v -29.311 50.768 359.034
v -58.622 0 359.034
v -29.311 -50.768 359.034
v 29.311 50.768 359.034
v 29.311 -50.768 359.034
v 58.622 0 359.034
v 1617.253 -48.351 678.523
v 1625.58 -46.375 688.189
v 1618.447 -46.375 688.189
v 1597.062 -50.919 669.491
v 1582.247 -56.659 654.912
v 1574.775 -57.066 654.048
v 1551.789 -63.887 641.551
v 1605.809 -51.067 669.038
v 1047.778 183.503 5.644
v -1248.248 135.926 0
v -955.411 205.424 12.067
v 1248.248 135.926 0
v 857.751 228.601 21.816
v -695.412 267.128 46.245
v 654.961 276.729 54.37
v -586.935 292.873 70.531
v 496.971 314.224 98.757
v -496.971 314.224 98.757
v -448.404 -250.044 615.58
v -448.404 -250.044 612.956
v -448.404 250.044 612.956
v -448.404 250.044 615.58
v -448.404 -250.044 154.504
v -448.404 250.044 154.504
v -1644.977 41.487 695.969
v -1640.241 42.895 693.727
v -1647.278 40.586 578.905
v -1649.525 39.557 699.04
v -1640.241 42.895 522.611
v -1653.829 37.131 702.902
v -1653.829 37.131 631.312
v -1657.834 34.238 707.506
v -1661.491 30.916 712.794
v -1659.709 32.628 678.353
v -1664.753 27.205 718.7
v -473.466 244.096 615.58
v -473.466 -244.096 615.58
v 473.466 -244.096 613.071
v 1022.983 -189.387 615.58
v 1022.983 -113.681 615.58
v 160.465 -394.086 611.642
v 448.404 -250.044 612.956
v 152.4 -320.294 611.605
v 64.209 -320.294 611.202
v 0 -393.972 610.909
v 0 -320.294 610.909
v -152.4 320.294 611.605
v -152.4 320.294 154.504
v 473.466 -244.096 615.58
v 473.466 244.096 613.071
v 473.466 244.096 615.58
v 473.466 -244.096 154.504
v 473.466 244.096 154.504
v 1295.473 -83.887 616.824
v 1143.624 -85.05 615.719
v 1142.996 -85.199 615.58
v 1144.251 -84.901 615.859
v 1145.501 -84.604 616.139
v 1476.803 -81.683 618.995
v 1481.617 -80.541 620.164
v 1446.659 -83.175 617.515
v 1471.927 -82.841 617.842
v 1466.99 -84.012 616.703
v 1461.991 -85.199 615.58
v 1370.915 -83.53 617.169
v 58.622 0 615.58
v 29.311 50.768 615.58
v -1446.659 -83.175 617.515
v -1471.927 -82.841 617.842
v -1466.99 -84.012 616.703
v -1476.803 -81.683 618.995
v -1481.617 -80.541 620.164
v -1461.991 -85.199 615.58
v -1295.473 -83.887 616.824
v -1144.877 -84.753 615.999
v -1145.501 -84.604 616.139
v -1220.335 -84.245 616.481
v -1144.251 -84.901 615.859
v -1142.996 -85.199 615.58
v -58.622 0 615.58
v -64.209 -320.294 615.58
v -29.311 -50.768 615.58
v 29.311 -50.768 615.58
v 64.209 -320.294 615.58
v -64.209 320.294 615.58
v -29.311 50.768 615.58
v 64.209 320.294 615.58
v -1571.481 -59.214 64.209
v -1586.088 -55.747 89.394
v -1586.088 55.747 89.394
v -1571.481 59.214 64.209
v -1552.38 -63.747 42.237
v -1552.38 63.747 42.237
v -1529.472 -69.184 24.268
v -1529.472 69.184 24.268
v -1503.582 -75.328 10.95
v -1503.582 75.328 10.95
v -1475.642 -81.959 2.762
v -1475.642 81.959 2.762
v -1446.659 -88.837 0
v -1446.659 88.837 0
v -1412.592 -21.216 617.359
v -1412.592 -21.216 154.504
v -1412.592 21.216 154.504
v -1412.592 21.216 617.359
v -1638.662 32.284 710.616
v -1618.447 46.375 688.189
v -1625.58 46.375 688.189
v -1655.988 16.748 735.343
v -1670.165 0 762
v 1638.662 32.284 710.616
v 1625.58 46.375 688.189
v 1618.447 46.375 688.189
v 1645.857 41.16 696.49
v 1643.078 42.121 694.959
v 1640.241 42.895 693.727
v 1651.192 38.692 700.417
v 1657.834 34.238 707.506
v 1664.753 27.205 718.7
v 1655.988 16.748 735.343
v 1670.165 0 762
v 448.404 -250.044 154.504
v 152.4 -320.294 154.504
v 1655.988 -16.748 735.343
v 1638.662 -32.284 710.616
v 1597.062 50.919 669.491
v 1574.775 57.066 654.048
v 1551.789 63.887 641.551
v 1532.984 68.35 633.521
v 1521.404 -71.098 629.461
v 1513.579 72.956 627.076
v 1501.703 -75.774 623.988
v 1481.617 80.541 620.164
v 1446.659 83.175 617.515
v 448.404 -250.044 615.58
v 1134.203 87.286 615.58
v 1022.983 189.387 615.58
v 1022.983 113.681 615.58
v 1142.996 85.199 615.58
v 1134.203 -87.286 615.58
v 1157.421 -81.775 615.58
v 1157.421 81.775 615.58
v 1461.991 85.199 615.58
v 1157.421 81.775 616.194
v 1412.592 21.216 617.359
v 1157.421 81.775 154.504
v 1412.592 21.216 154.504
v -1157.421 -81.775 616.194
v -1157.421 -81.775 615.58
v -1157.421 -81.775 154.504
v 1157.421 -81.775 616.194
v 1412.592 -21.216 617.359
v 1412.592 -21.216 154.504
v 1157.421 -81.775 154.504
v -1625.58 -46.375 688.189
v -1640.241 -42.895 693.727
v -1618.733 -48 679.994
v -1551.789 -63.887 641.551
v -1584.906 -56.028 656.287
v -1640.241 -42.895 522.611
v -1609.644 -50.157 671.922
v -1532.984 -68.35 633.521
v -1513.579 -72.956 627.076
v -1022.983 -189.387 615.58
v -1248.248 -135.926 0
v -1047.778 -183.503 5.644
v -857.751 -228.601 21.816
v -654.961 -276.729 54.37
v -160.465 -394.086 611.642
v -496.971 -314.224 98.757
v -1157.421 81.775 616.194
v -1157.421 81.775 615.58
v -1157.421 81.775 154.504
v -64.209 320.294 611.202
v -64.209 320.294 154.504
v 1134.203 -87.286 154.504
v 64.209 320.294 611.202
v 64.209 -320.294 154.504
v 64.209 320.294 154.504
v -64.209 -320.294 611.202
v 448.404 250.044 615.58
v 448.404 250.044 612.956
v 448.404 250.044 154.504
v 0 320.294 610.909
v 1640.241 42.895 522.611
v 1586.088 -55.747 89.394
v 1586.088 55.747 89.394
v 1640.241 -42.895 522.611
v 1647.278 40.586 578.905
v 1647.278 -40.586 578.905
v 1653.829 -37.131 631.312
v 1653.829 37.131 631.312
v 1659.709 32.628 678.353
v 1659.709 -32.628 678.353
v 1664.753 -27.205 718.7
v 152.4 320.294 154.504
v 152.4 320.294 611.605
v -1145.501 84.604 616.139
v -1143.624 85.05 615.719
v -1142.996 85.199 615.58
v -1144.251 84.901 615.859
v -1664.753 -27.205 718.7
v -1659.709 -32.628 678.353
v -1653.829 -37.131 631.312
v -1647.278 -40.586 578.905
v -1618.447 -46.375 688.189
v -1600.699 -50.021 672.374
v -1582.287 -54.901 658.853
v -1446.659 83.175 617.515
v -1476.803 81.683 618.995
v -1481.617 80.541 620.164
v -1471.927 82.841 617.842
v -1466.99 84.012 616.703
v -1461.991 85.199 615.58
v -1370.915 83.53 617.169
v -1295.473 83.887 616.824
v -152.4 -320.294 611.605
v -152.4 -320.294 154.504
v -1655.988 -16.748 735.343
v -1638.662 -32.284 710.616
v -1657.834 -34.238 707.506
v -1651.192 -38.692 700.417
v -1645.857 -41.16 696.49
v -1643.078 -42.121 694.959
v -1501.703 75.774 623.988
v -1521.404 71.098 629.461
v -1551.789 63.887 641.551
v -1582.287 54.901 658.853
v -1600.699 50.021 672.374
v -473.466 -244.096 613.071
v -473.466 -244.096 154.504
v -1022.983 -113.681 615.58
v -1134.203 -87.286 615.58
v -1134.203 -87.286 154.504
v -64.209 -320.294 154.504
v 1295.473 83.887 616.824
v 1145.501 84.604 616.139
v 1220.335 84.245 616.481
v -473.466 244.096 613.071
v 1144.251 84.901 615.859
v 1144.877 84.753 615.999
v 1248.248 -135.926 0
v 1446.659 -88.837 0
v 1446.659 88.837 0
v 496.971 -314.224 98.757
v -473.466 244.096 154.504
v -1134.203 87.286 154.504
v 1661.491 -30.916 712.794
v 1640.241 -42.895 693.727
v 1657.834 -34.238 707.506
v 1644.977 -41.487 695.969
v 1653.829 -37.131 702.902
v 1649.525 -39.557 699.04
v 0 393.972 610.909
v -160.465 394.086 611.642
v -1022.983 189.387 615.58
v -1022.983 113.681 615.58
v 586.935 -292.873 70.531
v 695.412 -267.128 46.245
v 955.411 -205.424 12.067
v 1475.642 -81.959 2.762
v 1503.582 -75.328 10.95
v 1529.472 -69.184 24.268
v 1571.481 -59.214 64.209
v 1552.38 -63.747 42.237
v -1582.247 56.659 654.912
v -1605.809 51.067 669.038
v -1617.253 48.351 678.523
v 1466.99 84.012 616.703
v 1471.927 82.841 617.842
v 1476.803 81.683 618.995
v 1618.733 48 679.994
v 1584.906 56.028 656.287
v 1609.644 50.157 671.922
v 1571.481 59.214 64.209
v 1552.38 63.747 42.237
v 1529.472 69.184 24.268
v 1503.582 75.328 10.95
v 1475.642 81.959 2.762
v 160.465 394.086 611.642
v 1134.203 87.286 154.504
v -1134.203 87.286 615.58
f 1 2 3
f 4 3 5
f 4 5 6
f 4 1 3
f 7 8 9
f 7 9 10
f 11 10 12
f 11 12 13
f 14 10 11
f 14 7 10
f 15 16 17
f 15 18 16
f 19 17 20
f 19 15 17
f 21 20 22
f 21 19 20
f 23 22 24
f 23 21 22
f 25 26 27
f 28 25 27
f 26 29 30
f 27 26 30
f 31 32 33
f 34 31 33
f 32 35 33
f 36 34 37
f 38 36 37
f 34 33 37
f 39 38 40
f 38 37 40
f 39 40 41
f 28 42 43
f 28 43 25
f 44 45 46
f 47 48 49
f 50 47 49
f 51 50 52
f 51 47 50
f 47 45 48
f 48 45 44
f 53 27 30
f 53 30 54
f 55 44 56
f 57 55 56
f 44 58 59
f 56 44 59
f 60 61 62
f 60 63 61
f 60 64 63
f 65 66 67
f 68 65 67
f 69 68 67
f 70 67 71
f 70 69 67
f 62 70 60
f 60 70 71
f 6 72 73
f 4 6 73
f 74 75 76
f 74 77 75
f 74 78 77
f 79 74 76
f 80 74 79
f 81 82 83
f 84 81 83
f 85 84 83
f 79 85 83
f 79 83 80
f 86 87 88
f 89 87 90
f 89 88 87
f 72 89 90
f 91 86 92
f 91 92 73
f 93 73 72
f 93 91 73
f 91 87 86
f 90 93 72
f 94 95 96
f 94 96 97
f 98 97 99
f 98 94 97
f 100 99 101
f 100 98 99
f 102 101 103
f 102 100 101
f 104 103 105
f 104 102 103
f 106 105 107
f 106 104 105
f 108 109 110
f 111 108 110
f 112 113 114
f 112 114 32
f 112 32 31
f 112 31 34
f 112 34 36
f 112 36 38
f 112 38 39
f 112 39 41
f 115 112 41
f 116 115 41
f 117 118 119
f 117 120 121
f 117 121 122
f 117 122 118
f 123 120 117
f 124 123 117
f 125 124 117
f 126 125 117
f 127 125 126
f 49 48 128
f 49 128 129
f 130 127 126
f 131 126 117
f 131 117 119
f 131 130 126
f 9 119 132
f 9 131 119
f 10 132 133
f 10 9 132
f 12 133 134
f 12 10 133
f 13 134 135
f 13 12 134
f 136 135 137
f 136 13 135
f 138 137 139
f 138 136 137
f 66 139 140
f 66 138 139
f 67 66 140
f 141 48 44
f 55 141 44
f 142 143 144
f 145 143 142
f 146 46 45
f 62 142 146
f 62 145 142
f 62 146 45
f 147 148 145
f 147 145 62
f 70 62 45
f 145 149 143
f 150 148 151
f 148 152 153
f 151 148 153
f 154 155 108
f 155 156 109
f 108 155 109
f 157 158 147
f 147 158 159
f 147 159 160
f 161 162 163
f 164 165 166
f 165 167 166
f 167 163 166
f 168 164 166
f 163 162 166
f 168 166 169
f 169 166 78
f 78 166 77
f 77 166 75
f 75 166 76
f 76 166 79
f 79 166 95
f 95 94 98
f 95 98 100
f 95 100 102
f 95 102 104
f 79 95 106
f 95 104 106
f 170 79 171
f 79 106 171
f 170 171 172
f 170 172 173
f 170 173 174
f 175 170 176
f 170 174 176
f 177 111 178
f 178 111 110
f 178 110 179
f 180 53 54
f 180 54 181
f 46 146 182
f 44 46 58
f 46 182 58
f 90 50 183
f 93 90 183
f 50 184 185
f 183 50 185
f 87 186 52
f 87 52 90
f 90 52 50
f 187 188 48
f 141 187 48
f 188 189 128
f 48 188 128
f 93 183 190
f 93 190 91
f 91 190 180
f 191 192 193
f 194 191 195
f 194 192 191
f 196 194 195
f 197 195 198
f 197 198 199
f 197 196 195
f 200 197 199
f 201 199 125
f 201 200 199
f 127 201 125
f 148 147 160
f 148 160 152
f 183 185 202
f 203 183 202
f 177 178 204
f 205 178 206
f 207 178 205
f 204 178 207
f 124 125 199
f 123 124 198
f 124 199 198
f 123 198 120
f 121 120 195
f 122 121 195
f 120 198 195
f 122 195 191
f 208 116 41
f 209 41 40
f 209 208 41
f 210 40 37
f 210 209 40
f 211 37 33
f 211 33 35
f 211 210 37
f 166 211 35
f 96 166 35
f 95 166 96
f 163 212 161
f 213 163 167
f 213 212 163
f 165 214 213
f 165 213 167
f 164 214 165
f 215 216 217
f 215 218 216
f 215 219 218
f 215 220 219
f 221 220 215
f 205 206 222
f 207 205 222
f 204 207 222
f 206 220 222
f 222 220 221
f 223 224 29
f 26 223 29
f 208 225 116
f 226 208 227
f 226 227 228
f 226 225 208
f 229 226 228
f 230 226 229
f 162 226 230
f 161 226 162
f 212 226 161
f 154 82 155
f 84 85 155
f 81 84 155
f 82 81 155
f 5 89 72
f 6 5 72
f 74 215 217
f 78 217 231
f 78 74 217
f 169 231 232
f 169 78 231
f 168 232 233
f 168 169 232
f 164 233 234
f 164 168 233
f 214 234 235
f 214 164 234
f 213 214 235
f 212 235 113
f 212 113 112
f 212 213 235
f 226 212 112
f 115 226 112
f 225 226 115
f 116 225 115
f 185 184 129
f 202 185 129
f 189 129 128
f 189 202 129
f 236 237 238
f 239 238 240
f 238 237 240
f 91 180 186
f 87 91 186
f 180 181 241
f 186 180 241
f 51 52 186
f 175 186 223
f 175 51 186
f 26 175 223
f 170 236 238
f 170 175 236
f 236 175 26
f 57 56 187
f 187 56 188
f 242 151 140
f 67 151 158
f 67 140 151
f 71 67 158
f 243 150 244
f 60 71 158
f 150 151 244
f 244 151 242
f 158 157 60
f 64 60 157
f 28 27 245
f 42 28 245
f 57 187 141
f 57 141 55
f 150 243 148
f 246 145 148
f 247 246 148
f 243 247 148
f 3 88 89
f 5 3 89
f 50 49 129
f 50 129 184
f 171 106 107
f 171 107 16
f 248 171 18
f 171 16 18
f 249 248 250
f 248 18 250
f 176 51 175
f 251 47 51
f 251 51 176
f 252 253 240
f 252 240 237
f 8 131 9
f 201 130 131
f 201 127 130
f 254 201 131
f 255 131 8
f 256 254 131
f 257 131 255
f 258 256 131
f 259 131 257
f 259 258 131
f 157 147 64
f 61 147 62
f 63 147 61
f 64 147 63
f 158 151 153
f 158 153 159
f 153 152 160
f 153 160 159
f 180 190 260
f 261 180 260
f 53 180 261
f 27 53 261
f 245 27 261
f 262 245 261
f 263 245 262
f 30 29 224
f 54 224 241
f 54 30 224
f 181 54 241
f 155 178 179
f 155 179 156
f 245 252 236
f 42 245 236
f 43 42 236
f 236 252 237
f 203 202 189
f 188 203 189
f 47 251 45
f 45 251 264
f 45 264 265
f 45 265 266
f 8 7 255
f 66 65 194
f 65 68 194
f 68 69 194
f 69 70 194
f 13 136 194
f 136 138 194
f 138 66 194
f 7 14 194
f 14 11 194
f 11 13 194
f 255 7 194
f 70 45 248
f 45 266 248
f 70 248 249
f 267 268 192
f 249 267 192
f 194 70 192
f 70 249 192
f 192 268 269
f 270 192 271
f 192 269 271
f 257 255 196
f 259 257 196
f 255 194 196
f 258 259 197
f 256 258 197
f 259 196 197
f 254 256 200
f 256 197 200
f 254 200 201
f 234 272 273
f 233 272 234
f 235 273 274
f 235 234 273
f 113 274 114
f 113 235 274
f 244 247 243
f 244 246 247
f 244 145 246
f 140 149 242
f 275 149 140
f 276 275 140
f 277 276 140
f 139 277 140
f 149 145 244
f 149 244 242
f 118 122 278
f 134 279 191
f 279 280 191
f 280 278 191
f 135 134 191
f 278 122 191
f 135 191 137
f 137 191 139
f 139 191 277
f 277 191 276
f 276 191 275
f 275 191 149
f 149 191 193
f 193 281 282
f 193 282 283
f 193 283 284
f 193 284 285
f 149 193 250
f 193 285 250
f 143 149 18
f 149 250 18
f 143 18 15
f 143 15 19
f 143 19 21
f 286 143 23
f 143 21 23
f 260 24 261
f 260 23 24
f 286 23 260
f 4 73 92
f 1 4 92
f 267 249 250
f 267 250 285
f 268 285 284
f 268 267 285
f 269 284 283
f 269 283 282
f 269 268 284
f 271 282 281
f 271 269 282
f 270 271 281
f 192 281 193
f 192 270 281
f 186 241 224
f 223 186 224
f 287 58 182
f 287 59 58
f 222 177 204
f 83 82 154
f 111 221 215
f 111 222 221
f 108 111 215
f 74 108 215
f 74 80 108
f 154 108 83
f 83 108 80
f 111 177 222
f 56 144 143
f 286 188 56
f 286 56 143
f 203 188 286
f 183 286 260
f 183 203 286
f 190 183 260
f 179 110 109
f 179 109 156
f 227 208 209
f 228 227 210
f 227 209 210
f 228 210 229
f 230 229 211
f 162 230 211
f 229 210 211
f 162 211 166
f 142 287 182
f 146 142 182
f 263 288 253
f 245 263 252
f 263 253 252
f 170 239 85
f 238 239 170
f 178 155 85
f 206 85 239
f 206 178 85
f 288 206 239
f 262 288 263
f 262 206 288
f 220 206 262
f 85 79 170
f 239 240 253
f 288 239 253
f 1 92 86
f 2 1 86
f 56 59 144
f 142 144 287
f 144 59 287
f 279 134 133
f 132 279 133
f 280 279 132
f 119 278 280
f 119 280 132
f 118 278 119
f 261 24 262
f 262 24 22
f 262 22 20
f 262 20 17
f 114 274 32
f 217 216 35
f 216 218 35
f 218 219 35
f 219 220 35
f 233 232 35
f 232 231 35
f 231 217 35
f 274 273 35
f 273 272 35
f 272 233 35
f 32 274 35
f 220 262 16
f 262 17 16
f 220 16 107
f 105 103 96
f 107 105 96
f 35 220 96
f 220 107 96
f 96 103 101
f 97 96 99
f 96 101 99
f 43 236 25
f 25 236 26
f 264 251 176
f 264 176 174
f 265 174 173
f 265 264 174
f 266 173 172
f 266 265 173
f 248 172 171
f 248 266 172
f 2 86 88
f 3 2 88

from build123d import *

# Parameters (mm, degrees)
F1_DEPTH  = 762
F3_DEPTH  = 3262.12516
F5_DEPTH  = 5632.86409
F0_W      = 64.2092358321
F0_H      = 320.2939988333
F6_DEPTH  = 615.5799728
F7_DEPTH  = 154.50383
F8_DEPTH  = 5077.3668
F10_DEPTH = 256.54628


with BuildPart() as f1:
    # F0 (on Top) → F1 (new body)
    with BuildSketch(Plane.XY):
        with BuildLine():
            Line((152.4, 396), (0, 396))
            Line((0, 396), (0, 320.2939988333))
            Line((0, 320.2939988333), (64.2092358321, 320.2939988333))
            Line((64.2092358321, 320.2939988333), (152.4, 320.2939988333))
            Line((152.4, 320.2939988333), (448.4036082625, 250.0443583168))
            Line((448.4036082625, 250.0443583168), (473.4656074554, 244.0964698966))
            Line((473.4656074554, 244.0964698966), (1134.202851765, 87.2856993755))
            Line((1134.202851765, 87.2856993755), (1157.4211369828, 81.7753740131))
            Line((1157.4211369828, 81.7753740131), (1412.5922299482, 21.2163907755))
            Line((1412.5922299482, 21.2163907755), (1412.5922299482, 0))
            Line((1412.5922299482, 0), (1674.1474049633, 0))
            ThreePointArc((1674.1474049633, 0), (1664.6471807808, 27.3388481675), (1640.2409076691, 42.8952202201))
            Line((1640.2409076691, 42.8952202201), (152.4, 396))
        make_face()
        with BuildLine():
            Line((0, 320.2939988333), (0, 396))
            Line((0, 396), (-152.4, 396))
            Line((-152.4, 396), (-1640.2409076691, 42.8952202201))
            ThreePointArc((-1640.2409076691, 42.8952202201), (-1664.6471807808, 27.3388481675), (-1674.1474049633, 0))
            Line((-1674.1474049633, 0), (-1412.5922299482, 0))
            Line((-1412.5922299482, 0), (-1412.5922299482, 21.2163907755))
            Line((-1412.5922299482, 21.2163907755), (-1157.4211369828, 81.7753740131))
            Line((-1157.4211369828, 81.7753740131), (-1134.202851765, 87.2856993755))
            Line((-1134.202851765, 87.2856993755), (-473.4656074554, 244.0964698966))
            Line((-473.4656074554, 244.0964698966), (-448.4036082625, 250.0443583168))
            Line((-448.4036082625, 250.0443583168), (-152.4, 320.2939988333))
            Line((-152.4, 320.2939988333), (-64.2092358321, 320.2939988333))
            Line((-64.2092358321, 320.2939988333), (0, 320.2939988333))
        make_face()
        with BuildLine():
            Line((64.2092358321, -320.2939988333), (0, -320.2939988333))
            Line((0, -320.2939988333), (0, -396))
            Line((0, -396), (152.4, -396))
            Line((152.4, -396), (1640.2409076691, -42.8952202201))
            ThreePointArc((1640.2409076691, -42.8952202201), (1664.6471807808, -27.3388481675), (1674.1474049633, 0))
            Line((1674.1474049633, 0), (1412.5922299482, 0))
            Line((1412.5922299482, 0), (1412.5922299482, -21.2163907755))
            Line((1412.5922299482, -21.2163907755), (1157.4211369828, -81.7753740131))
            Line((1157.4211369828, -81.7753740131), (1134.202851765, -87.2856993755))
            Line((1134.202851765, -87.2856993755), (473.4656074554, -244.0964698966))
            Line((473.4656074554, -244.0964698966), (448.4036082625, -250.0443583168))
            Line((448.4036082625, -250.0443583168), (152.4, -320.2939988333))
            Line((152.4, -320.2939988333), (64.2092358321, -320.2939988333))
        make_face()
        with BuildLine():
            Line((0, -396), (0, -320.2939988333))
            Line((0, -320.2939988333), (-64.2092358321, -320.2939988333))
            Line((-64.2092358321, -320.2939988333), (-152.4, -320.2939988333))
            Line((-152.4, -320.2939988333), (-448.4036082625, -250.0443583168))
            Line((-448.4036082625, -250.0443583168), (-473.4656074554, -244.0964698966))
            Line((-473.4656074554, -244.0964698966), (-1134.202851765, -87.2856993755))
            Line((-1134.202851765, -87.2856993755), (-1157.4211369828, -81.7753740131))
            Line((-1157.4211369828, -81.7753740131), (-1412.5922299482, -21.2163907755))
            Line((-1412.5922299482, -21.2163907755), (-1412.5922299482, 0))
            Line((-1412.5922299482, 0), (-1674.1474049633, 0))
            ThreePointArc((-1674.1474049633, 0), (-1664.6471807808, -27.3388481675), (-1640.2409076691, -42.8952202201))
            Line((-1640.2409076691, -42.8952202201), (-152.4, -396))
            Line((-152.4, -396), (0, -396))
        make_face()
    extrude(amount=F1_DEPTH)

    # F2 (on Front) → F3 (intersect, symmetric)
    with BuildSketch(Plane.XZ):
        Polygon((-1446.6592213701, 617.5145506859), (-1446.6592213701, 0), (0, 0), (1446.6592213701, 0), (1446.6592213701, 617.5145506859), (0, 610.9088516681), align=None)
        with BuildLine():
            ThreePointArc((-1586.0875844955, 89.3943980336), (-1529.4717005681, 24.2677958419), (-1446.6592213701, 0))
            Line((-1446.6592213701, 0), (-1446.6592213701, 617.5145506859))
            ThreePointArc((-1446.6592213701, 617.5145506859), (-1579.5504767394, 657.0582695217), (-1670.16518116, 762))
            Line((-1670.16518116, 762), (-1586.0875844955, 89.3943980336))
        make_face()
        with BuildLine():
            Line((1446.6592213701, 617.5145506859), (1446.6592213701, 0))
            ThreePointArc((1446.6592213701, 0), (1529.4717005681, 24.2677958419), (1586.0875844955, 89.3943980336))
            Line((1586.0875844955, 89.3943980336), (1670.16518116, 762))
            ThreePointArc((1670.16518116, 762), (1579.5504767394, 657.0582695217), (1446.6592213701, 617.5145506859))
        make_face()
    extrude(amount=F3_DEPTH, both=True, mode=Mode.INTERSECT)

    # F4 (on Right) → F5 (intersect, symmetric)
    with BuildSketch(Plane.YZ):
        with BuildLine():
            Line((314.2239749432, 98.7573415041), (394.6990966797, 615.5799728))
            Line((394.6990966797, 615.5799728), (85.1987600327, 615.5799728))
            ThreePointArc((85.1987600327, 615.5799728), (59.7792722532, 648.6725517035), (46.3746413589, 688.1894469261))
            Line((46.3746413589, 688.1894469261), (0, 762))
            Line((0, 762), (0, 0))
            Line((0, 0), (135.9257698059, 0))
            ThreePointArc((135.9257698059, 0), (237.7059563227, 26.5742942613), (314.2239749432, 98.7573415041))
        make_face()
        with BuildLine():
            Line((0, 0), (0, 762))
            Line((0, 762), (-46.3746413589, 688.1894469261))
            ThreePointArc((-46.3746413589, 688.1894469261), (-59.7792722532, 648.6725517035), (-85.1987600327, 615.5799728))
            Line((-85.1987600327, 615.5799728), (-394.6990966797, 615.5799728))
            Line((-394.6990966797, 615.5799728), (-314.2239749432, 98.7573415041))
            ThreePointArc((-314.2239749432, 98.7573415041), (-237.7059563227, 26.5742942613), (-135.9257698059, 0))
            Line((-135.9257698059, 0), (0, 0))
        make_face()
    extrude(amount=F5_DEPTH, both=True, mode=Mode.INTERSECT)

    # F0 (on Top) → F6 (join)
    with BuildSketch(Plane.XY):
        Polygon((-1157.4211369828, 81.7753740131), (-1157.4211369828, 0), (-1134.202851765, 0), (-1134.202851765, 87.2856993755), align=None)
        Polygon((-1134.202851765, 0), (-1157.4211369828, 0), (-1157.4211369828, -81.7753740131), (-1134.202851765, -87.2856993755), align=None)
        Polygon((-473.4656074554, 0), (-448.4036082625, 0), (-448.4036082625, 250.0443583168), (-473.4656074554, 244.0964698966), align=None)
        Polygon((-448.4036082625, -250.0443583168), (-448.4036082625, 0), (-473.4656074554, 0), (-473.4656074554, -244.0964698966), align=None)
        with Locations((32.104617916, 160.1469994167)):
            Rectangle(F0_W, F0_H)
        with Locations((32.104617916, -160.1469994167)):
            Rectangle(F0_W, F0_H)
        with Locations((-32.104617916, -160.1469994167)):
            Rectangle(F0_W, F0_H)
        with Locations((-32.104617916, 160.1469994167)):
            Rectangle(F0_W, F0_H)
        Polygon((448.4036082625, 250.0443583168), (448.4036082625, 0), (473.4656074554, 0), (473.4656074554, 244.0964698965), align=None)
        Polygon((473.4656074554, 0), (448.4036082625, 0), (448.4036082625, -250.0443583168), (473.4656074554, -244.0964698966), align=None)
        Polygon((1134.202851765, 0), (1157.4211369828, 0), (1157.4211369828, 81.7753740131), (1134.202851765, 87.2856993755), align=None)
        Polygon((1157.4211369828, -81.7753740131), (1157.4211369828, 0), (1134.202851765, 0), (1134.202851765, -87.2856993755), align=None)
    extrude(amount=F6_DEPTH)

    # F0 (on Top) → F7 (join)
    with BuildSketch(Plane.XY):
        Polygon((-64.2092358321, 0), (-64.2092358321, 320.2939988333), (-152.4, 320.2939988333), (-448.4036082625, 250.0443583168), (-448.4036082625, 0), align=None)
        Polygon((-1134.202851765, 0), (-473.4656074554, 0), (-473.4656074554, 244.0964698965), (-1134.202851765, 87.2856993755), align=None)
        Polygon((-1412.5922299482, 21.2163907755), (-1412.5922299482, 0), (-1157.4211369828, 0), (-1157.4211369828, 81.7753740131), align=None)
        Polygon((-1157.4211369828, 0), (-1412.5922299482, 0), (-1412.5922299482, -21.2163907755), (-1157.4211369828, -81.7753740131), align=None)
        Polygon((-473.4656074554, -244.0964698966), (-473.4656074554, 0), (-1134.202851765, 0), (-1134.202851765, -87.2856993755), align=None)
        Polygon((-64.2092358321, -320.2939988333), (-64.2092358321, 0), (-448.4036082625, 0), (-448.4036082625, -250.0443583168), (-152.4, -320.2939988333), align=None)
        Polygon((152.4, 320.2939988333), (64.2092358321, 320.2939988333), (64.2092358321, 0), (448.4036082625, 0), (448.4036082625, 250.0443583168), align=None)
        Polygon((448.4036082625, 0), (64.2092358321, 0), (64.2092358321, -320.2939988333), (152.4, -320.2939988333), (448.4036082625, -250.0443583168), align=None)
        Polygon((1134.202851765, 0), (473.4656074554, 0), (473.4656074554, -244.0964698965), (1134.202851765, -87.2856993755), align=None)
        Polygon((473.4656074554, 244.0964698965), (473.4656074554, 0), (1134.202851765, 0), (1134.202851765, 87.2856993755), align=None)
        Polygon((1157.4211369828, 0), (1412.5922299482, 0), (1412.5922299482, 21.2163907755), (1157.4211369828, 81.7753740131), align=None)
        Polygon((1412.5922299482, -21.2163907755), (1412.5922299482, 0), (1157.4211369828, 0), (1157.4211369828, -81.7753740131), align=None)
    extrude(amount=F7_DEPTH)

    # F4 (on Right) → F8 (intersect, symmetric)
    with BuildSketch(Plane.YZ):
        with BuildLine():
            Line((314.2239749432, 98.7573415041), (394.6990966797, 615.5799728))
            Line((394.6990966797, 615.5799728), (85.1987600327, 615.5799728))
            ThreePointArc((85.1987600327, 615.5799728), (59.7792722532, 648.6725517035), (46.3746413589, 688.1894469261))
            Line((46.3746413589, 688.1894469261), (0, 762))
            Line((0, 762), (0, 0))
            Line((0, 0), (135.9257698059, 0))
            ThreePointArc((135.9257698059, 0), (237.7059563227, 26.5742942613), (314.2239749432, 98.7573415041))
        make_face()
        with BuildLine():
            Line((0, 0), (0, 762))
            Line((0, 762), (-46.3746413589, 688.1894469261))
            ThreePointArc((-46.3746413589, 688.1894469261), (-59.7792722532, 648.6725517035), (-85.1987600327, 615.5799728))
            Line((-85.1987600327, 615.5799728), (-394.6990966797, 615.5799728))
            Line((-394.6990966797, 615.5799728), (-314.2239749432, 98.7573415041))
            ThreePointArc((-314.2239749432, 98.7573415041), (-237.7059563227, 26.5742942613), (-135.9257698059, 0))
            Line((-135.9257698059, 0), (0, 0))
        make_face()
    extrude(amount=F8_DEPTH, both=True, mode=Mode.INTERSECT)

    # F9 (on face) → F10 (cut)
    with BuildSketch(Plane.XY.offset(615.5799728)):
        Polygon((-29.3112018763, -50.7684908807), (29.3112018763, -50.7684908807), (58.6224037527, 0), (29.3112018763, 50.7684908807), (-29.3112018763, 50.7684908807), (-58.6224037527, 0), align=None)
    extrude(amount=-F10_DEPTH, mode=Mode.SUBTRACT)


solid = f1.part
